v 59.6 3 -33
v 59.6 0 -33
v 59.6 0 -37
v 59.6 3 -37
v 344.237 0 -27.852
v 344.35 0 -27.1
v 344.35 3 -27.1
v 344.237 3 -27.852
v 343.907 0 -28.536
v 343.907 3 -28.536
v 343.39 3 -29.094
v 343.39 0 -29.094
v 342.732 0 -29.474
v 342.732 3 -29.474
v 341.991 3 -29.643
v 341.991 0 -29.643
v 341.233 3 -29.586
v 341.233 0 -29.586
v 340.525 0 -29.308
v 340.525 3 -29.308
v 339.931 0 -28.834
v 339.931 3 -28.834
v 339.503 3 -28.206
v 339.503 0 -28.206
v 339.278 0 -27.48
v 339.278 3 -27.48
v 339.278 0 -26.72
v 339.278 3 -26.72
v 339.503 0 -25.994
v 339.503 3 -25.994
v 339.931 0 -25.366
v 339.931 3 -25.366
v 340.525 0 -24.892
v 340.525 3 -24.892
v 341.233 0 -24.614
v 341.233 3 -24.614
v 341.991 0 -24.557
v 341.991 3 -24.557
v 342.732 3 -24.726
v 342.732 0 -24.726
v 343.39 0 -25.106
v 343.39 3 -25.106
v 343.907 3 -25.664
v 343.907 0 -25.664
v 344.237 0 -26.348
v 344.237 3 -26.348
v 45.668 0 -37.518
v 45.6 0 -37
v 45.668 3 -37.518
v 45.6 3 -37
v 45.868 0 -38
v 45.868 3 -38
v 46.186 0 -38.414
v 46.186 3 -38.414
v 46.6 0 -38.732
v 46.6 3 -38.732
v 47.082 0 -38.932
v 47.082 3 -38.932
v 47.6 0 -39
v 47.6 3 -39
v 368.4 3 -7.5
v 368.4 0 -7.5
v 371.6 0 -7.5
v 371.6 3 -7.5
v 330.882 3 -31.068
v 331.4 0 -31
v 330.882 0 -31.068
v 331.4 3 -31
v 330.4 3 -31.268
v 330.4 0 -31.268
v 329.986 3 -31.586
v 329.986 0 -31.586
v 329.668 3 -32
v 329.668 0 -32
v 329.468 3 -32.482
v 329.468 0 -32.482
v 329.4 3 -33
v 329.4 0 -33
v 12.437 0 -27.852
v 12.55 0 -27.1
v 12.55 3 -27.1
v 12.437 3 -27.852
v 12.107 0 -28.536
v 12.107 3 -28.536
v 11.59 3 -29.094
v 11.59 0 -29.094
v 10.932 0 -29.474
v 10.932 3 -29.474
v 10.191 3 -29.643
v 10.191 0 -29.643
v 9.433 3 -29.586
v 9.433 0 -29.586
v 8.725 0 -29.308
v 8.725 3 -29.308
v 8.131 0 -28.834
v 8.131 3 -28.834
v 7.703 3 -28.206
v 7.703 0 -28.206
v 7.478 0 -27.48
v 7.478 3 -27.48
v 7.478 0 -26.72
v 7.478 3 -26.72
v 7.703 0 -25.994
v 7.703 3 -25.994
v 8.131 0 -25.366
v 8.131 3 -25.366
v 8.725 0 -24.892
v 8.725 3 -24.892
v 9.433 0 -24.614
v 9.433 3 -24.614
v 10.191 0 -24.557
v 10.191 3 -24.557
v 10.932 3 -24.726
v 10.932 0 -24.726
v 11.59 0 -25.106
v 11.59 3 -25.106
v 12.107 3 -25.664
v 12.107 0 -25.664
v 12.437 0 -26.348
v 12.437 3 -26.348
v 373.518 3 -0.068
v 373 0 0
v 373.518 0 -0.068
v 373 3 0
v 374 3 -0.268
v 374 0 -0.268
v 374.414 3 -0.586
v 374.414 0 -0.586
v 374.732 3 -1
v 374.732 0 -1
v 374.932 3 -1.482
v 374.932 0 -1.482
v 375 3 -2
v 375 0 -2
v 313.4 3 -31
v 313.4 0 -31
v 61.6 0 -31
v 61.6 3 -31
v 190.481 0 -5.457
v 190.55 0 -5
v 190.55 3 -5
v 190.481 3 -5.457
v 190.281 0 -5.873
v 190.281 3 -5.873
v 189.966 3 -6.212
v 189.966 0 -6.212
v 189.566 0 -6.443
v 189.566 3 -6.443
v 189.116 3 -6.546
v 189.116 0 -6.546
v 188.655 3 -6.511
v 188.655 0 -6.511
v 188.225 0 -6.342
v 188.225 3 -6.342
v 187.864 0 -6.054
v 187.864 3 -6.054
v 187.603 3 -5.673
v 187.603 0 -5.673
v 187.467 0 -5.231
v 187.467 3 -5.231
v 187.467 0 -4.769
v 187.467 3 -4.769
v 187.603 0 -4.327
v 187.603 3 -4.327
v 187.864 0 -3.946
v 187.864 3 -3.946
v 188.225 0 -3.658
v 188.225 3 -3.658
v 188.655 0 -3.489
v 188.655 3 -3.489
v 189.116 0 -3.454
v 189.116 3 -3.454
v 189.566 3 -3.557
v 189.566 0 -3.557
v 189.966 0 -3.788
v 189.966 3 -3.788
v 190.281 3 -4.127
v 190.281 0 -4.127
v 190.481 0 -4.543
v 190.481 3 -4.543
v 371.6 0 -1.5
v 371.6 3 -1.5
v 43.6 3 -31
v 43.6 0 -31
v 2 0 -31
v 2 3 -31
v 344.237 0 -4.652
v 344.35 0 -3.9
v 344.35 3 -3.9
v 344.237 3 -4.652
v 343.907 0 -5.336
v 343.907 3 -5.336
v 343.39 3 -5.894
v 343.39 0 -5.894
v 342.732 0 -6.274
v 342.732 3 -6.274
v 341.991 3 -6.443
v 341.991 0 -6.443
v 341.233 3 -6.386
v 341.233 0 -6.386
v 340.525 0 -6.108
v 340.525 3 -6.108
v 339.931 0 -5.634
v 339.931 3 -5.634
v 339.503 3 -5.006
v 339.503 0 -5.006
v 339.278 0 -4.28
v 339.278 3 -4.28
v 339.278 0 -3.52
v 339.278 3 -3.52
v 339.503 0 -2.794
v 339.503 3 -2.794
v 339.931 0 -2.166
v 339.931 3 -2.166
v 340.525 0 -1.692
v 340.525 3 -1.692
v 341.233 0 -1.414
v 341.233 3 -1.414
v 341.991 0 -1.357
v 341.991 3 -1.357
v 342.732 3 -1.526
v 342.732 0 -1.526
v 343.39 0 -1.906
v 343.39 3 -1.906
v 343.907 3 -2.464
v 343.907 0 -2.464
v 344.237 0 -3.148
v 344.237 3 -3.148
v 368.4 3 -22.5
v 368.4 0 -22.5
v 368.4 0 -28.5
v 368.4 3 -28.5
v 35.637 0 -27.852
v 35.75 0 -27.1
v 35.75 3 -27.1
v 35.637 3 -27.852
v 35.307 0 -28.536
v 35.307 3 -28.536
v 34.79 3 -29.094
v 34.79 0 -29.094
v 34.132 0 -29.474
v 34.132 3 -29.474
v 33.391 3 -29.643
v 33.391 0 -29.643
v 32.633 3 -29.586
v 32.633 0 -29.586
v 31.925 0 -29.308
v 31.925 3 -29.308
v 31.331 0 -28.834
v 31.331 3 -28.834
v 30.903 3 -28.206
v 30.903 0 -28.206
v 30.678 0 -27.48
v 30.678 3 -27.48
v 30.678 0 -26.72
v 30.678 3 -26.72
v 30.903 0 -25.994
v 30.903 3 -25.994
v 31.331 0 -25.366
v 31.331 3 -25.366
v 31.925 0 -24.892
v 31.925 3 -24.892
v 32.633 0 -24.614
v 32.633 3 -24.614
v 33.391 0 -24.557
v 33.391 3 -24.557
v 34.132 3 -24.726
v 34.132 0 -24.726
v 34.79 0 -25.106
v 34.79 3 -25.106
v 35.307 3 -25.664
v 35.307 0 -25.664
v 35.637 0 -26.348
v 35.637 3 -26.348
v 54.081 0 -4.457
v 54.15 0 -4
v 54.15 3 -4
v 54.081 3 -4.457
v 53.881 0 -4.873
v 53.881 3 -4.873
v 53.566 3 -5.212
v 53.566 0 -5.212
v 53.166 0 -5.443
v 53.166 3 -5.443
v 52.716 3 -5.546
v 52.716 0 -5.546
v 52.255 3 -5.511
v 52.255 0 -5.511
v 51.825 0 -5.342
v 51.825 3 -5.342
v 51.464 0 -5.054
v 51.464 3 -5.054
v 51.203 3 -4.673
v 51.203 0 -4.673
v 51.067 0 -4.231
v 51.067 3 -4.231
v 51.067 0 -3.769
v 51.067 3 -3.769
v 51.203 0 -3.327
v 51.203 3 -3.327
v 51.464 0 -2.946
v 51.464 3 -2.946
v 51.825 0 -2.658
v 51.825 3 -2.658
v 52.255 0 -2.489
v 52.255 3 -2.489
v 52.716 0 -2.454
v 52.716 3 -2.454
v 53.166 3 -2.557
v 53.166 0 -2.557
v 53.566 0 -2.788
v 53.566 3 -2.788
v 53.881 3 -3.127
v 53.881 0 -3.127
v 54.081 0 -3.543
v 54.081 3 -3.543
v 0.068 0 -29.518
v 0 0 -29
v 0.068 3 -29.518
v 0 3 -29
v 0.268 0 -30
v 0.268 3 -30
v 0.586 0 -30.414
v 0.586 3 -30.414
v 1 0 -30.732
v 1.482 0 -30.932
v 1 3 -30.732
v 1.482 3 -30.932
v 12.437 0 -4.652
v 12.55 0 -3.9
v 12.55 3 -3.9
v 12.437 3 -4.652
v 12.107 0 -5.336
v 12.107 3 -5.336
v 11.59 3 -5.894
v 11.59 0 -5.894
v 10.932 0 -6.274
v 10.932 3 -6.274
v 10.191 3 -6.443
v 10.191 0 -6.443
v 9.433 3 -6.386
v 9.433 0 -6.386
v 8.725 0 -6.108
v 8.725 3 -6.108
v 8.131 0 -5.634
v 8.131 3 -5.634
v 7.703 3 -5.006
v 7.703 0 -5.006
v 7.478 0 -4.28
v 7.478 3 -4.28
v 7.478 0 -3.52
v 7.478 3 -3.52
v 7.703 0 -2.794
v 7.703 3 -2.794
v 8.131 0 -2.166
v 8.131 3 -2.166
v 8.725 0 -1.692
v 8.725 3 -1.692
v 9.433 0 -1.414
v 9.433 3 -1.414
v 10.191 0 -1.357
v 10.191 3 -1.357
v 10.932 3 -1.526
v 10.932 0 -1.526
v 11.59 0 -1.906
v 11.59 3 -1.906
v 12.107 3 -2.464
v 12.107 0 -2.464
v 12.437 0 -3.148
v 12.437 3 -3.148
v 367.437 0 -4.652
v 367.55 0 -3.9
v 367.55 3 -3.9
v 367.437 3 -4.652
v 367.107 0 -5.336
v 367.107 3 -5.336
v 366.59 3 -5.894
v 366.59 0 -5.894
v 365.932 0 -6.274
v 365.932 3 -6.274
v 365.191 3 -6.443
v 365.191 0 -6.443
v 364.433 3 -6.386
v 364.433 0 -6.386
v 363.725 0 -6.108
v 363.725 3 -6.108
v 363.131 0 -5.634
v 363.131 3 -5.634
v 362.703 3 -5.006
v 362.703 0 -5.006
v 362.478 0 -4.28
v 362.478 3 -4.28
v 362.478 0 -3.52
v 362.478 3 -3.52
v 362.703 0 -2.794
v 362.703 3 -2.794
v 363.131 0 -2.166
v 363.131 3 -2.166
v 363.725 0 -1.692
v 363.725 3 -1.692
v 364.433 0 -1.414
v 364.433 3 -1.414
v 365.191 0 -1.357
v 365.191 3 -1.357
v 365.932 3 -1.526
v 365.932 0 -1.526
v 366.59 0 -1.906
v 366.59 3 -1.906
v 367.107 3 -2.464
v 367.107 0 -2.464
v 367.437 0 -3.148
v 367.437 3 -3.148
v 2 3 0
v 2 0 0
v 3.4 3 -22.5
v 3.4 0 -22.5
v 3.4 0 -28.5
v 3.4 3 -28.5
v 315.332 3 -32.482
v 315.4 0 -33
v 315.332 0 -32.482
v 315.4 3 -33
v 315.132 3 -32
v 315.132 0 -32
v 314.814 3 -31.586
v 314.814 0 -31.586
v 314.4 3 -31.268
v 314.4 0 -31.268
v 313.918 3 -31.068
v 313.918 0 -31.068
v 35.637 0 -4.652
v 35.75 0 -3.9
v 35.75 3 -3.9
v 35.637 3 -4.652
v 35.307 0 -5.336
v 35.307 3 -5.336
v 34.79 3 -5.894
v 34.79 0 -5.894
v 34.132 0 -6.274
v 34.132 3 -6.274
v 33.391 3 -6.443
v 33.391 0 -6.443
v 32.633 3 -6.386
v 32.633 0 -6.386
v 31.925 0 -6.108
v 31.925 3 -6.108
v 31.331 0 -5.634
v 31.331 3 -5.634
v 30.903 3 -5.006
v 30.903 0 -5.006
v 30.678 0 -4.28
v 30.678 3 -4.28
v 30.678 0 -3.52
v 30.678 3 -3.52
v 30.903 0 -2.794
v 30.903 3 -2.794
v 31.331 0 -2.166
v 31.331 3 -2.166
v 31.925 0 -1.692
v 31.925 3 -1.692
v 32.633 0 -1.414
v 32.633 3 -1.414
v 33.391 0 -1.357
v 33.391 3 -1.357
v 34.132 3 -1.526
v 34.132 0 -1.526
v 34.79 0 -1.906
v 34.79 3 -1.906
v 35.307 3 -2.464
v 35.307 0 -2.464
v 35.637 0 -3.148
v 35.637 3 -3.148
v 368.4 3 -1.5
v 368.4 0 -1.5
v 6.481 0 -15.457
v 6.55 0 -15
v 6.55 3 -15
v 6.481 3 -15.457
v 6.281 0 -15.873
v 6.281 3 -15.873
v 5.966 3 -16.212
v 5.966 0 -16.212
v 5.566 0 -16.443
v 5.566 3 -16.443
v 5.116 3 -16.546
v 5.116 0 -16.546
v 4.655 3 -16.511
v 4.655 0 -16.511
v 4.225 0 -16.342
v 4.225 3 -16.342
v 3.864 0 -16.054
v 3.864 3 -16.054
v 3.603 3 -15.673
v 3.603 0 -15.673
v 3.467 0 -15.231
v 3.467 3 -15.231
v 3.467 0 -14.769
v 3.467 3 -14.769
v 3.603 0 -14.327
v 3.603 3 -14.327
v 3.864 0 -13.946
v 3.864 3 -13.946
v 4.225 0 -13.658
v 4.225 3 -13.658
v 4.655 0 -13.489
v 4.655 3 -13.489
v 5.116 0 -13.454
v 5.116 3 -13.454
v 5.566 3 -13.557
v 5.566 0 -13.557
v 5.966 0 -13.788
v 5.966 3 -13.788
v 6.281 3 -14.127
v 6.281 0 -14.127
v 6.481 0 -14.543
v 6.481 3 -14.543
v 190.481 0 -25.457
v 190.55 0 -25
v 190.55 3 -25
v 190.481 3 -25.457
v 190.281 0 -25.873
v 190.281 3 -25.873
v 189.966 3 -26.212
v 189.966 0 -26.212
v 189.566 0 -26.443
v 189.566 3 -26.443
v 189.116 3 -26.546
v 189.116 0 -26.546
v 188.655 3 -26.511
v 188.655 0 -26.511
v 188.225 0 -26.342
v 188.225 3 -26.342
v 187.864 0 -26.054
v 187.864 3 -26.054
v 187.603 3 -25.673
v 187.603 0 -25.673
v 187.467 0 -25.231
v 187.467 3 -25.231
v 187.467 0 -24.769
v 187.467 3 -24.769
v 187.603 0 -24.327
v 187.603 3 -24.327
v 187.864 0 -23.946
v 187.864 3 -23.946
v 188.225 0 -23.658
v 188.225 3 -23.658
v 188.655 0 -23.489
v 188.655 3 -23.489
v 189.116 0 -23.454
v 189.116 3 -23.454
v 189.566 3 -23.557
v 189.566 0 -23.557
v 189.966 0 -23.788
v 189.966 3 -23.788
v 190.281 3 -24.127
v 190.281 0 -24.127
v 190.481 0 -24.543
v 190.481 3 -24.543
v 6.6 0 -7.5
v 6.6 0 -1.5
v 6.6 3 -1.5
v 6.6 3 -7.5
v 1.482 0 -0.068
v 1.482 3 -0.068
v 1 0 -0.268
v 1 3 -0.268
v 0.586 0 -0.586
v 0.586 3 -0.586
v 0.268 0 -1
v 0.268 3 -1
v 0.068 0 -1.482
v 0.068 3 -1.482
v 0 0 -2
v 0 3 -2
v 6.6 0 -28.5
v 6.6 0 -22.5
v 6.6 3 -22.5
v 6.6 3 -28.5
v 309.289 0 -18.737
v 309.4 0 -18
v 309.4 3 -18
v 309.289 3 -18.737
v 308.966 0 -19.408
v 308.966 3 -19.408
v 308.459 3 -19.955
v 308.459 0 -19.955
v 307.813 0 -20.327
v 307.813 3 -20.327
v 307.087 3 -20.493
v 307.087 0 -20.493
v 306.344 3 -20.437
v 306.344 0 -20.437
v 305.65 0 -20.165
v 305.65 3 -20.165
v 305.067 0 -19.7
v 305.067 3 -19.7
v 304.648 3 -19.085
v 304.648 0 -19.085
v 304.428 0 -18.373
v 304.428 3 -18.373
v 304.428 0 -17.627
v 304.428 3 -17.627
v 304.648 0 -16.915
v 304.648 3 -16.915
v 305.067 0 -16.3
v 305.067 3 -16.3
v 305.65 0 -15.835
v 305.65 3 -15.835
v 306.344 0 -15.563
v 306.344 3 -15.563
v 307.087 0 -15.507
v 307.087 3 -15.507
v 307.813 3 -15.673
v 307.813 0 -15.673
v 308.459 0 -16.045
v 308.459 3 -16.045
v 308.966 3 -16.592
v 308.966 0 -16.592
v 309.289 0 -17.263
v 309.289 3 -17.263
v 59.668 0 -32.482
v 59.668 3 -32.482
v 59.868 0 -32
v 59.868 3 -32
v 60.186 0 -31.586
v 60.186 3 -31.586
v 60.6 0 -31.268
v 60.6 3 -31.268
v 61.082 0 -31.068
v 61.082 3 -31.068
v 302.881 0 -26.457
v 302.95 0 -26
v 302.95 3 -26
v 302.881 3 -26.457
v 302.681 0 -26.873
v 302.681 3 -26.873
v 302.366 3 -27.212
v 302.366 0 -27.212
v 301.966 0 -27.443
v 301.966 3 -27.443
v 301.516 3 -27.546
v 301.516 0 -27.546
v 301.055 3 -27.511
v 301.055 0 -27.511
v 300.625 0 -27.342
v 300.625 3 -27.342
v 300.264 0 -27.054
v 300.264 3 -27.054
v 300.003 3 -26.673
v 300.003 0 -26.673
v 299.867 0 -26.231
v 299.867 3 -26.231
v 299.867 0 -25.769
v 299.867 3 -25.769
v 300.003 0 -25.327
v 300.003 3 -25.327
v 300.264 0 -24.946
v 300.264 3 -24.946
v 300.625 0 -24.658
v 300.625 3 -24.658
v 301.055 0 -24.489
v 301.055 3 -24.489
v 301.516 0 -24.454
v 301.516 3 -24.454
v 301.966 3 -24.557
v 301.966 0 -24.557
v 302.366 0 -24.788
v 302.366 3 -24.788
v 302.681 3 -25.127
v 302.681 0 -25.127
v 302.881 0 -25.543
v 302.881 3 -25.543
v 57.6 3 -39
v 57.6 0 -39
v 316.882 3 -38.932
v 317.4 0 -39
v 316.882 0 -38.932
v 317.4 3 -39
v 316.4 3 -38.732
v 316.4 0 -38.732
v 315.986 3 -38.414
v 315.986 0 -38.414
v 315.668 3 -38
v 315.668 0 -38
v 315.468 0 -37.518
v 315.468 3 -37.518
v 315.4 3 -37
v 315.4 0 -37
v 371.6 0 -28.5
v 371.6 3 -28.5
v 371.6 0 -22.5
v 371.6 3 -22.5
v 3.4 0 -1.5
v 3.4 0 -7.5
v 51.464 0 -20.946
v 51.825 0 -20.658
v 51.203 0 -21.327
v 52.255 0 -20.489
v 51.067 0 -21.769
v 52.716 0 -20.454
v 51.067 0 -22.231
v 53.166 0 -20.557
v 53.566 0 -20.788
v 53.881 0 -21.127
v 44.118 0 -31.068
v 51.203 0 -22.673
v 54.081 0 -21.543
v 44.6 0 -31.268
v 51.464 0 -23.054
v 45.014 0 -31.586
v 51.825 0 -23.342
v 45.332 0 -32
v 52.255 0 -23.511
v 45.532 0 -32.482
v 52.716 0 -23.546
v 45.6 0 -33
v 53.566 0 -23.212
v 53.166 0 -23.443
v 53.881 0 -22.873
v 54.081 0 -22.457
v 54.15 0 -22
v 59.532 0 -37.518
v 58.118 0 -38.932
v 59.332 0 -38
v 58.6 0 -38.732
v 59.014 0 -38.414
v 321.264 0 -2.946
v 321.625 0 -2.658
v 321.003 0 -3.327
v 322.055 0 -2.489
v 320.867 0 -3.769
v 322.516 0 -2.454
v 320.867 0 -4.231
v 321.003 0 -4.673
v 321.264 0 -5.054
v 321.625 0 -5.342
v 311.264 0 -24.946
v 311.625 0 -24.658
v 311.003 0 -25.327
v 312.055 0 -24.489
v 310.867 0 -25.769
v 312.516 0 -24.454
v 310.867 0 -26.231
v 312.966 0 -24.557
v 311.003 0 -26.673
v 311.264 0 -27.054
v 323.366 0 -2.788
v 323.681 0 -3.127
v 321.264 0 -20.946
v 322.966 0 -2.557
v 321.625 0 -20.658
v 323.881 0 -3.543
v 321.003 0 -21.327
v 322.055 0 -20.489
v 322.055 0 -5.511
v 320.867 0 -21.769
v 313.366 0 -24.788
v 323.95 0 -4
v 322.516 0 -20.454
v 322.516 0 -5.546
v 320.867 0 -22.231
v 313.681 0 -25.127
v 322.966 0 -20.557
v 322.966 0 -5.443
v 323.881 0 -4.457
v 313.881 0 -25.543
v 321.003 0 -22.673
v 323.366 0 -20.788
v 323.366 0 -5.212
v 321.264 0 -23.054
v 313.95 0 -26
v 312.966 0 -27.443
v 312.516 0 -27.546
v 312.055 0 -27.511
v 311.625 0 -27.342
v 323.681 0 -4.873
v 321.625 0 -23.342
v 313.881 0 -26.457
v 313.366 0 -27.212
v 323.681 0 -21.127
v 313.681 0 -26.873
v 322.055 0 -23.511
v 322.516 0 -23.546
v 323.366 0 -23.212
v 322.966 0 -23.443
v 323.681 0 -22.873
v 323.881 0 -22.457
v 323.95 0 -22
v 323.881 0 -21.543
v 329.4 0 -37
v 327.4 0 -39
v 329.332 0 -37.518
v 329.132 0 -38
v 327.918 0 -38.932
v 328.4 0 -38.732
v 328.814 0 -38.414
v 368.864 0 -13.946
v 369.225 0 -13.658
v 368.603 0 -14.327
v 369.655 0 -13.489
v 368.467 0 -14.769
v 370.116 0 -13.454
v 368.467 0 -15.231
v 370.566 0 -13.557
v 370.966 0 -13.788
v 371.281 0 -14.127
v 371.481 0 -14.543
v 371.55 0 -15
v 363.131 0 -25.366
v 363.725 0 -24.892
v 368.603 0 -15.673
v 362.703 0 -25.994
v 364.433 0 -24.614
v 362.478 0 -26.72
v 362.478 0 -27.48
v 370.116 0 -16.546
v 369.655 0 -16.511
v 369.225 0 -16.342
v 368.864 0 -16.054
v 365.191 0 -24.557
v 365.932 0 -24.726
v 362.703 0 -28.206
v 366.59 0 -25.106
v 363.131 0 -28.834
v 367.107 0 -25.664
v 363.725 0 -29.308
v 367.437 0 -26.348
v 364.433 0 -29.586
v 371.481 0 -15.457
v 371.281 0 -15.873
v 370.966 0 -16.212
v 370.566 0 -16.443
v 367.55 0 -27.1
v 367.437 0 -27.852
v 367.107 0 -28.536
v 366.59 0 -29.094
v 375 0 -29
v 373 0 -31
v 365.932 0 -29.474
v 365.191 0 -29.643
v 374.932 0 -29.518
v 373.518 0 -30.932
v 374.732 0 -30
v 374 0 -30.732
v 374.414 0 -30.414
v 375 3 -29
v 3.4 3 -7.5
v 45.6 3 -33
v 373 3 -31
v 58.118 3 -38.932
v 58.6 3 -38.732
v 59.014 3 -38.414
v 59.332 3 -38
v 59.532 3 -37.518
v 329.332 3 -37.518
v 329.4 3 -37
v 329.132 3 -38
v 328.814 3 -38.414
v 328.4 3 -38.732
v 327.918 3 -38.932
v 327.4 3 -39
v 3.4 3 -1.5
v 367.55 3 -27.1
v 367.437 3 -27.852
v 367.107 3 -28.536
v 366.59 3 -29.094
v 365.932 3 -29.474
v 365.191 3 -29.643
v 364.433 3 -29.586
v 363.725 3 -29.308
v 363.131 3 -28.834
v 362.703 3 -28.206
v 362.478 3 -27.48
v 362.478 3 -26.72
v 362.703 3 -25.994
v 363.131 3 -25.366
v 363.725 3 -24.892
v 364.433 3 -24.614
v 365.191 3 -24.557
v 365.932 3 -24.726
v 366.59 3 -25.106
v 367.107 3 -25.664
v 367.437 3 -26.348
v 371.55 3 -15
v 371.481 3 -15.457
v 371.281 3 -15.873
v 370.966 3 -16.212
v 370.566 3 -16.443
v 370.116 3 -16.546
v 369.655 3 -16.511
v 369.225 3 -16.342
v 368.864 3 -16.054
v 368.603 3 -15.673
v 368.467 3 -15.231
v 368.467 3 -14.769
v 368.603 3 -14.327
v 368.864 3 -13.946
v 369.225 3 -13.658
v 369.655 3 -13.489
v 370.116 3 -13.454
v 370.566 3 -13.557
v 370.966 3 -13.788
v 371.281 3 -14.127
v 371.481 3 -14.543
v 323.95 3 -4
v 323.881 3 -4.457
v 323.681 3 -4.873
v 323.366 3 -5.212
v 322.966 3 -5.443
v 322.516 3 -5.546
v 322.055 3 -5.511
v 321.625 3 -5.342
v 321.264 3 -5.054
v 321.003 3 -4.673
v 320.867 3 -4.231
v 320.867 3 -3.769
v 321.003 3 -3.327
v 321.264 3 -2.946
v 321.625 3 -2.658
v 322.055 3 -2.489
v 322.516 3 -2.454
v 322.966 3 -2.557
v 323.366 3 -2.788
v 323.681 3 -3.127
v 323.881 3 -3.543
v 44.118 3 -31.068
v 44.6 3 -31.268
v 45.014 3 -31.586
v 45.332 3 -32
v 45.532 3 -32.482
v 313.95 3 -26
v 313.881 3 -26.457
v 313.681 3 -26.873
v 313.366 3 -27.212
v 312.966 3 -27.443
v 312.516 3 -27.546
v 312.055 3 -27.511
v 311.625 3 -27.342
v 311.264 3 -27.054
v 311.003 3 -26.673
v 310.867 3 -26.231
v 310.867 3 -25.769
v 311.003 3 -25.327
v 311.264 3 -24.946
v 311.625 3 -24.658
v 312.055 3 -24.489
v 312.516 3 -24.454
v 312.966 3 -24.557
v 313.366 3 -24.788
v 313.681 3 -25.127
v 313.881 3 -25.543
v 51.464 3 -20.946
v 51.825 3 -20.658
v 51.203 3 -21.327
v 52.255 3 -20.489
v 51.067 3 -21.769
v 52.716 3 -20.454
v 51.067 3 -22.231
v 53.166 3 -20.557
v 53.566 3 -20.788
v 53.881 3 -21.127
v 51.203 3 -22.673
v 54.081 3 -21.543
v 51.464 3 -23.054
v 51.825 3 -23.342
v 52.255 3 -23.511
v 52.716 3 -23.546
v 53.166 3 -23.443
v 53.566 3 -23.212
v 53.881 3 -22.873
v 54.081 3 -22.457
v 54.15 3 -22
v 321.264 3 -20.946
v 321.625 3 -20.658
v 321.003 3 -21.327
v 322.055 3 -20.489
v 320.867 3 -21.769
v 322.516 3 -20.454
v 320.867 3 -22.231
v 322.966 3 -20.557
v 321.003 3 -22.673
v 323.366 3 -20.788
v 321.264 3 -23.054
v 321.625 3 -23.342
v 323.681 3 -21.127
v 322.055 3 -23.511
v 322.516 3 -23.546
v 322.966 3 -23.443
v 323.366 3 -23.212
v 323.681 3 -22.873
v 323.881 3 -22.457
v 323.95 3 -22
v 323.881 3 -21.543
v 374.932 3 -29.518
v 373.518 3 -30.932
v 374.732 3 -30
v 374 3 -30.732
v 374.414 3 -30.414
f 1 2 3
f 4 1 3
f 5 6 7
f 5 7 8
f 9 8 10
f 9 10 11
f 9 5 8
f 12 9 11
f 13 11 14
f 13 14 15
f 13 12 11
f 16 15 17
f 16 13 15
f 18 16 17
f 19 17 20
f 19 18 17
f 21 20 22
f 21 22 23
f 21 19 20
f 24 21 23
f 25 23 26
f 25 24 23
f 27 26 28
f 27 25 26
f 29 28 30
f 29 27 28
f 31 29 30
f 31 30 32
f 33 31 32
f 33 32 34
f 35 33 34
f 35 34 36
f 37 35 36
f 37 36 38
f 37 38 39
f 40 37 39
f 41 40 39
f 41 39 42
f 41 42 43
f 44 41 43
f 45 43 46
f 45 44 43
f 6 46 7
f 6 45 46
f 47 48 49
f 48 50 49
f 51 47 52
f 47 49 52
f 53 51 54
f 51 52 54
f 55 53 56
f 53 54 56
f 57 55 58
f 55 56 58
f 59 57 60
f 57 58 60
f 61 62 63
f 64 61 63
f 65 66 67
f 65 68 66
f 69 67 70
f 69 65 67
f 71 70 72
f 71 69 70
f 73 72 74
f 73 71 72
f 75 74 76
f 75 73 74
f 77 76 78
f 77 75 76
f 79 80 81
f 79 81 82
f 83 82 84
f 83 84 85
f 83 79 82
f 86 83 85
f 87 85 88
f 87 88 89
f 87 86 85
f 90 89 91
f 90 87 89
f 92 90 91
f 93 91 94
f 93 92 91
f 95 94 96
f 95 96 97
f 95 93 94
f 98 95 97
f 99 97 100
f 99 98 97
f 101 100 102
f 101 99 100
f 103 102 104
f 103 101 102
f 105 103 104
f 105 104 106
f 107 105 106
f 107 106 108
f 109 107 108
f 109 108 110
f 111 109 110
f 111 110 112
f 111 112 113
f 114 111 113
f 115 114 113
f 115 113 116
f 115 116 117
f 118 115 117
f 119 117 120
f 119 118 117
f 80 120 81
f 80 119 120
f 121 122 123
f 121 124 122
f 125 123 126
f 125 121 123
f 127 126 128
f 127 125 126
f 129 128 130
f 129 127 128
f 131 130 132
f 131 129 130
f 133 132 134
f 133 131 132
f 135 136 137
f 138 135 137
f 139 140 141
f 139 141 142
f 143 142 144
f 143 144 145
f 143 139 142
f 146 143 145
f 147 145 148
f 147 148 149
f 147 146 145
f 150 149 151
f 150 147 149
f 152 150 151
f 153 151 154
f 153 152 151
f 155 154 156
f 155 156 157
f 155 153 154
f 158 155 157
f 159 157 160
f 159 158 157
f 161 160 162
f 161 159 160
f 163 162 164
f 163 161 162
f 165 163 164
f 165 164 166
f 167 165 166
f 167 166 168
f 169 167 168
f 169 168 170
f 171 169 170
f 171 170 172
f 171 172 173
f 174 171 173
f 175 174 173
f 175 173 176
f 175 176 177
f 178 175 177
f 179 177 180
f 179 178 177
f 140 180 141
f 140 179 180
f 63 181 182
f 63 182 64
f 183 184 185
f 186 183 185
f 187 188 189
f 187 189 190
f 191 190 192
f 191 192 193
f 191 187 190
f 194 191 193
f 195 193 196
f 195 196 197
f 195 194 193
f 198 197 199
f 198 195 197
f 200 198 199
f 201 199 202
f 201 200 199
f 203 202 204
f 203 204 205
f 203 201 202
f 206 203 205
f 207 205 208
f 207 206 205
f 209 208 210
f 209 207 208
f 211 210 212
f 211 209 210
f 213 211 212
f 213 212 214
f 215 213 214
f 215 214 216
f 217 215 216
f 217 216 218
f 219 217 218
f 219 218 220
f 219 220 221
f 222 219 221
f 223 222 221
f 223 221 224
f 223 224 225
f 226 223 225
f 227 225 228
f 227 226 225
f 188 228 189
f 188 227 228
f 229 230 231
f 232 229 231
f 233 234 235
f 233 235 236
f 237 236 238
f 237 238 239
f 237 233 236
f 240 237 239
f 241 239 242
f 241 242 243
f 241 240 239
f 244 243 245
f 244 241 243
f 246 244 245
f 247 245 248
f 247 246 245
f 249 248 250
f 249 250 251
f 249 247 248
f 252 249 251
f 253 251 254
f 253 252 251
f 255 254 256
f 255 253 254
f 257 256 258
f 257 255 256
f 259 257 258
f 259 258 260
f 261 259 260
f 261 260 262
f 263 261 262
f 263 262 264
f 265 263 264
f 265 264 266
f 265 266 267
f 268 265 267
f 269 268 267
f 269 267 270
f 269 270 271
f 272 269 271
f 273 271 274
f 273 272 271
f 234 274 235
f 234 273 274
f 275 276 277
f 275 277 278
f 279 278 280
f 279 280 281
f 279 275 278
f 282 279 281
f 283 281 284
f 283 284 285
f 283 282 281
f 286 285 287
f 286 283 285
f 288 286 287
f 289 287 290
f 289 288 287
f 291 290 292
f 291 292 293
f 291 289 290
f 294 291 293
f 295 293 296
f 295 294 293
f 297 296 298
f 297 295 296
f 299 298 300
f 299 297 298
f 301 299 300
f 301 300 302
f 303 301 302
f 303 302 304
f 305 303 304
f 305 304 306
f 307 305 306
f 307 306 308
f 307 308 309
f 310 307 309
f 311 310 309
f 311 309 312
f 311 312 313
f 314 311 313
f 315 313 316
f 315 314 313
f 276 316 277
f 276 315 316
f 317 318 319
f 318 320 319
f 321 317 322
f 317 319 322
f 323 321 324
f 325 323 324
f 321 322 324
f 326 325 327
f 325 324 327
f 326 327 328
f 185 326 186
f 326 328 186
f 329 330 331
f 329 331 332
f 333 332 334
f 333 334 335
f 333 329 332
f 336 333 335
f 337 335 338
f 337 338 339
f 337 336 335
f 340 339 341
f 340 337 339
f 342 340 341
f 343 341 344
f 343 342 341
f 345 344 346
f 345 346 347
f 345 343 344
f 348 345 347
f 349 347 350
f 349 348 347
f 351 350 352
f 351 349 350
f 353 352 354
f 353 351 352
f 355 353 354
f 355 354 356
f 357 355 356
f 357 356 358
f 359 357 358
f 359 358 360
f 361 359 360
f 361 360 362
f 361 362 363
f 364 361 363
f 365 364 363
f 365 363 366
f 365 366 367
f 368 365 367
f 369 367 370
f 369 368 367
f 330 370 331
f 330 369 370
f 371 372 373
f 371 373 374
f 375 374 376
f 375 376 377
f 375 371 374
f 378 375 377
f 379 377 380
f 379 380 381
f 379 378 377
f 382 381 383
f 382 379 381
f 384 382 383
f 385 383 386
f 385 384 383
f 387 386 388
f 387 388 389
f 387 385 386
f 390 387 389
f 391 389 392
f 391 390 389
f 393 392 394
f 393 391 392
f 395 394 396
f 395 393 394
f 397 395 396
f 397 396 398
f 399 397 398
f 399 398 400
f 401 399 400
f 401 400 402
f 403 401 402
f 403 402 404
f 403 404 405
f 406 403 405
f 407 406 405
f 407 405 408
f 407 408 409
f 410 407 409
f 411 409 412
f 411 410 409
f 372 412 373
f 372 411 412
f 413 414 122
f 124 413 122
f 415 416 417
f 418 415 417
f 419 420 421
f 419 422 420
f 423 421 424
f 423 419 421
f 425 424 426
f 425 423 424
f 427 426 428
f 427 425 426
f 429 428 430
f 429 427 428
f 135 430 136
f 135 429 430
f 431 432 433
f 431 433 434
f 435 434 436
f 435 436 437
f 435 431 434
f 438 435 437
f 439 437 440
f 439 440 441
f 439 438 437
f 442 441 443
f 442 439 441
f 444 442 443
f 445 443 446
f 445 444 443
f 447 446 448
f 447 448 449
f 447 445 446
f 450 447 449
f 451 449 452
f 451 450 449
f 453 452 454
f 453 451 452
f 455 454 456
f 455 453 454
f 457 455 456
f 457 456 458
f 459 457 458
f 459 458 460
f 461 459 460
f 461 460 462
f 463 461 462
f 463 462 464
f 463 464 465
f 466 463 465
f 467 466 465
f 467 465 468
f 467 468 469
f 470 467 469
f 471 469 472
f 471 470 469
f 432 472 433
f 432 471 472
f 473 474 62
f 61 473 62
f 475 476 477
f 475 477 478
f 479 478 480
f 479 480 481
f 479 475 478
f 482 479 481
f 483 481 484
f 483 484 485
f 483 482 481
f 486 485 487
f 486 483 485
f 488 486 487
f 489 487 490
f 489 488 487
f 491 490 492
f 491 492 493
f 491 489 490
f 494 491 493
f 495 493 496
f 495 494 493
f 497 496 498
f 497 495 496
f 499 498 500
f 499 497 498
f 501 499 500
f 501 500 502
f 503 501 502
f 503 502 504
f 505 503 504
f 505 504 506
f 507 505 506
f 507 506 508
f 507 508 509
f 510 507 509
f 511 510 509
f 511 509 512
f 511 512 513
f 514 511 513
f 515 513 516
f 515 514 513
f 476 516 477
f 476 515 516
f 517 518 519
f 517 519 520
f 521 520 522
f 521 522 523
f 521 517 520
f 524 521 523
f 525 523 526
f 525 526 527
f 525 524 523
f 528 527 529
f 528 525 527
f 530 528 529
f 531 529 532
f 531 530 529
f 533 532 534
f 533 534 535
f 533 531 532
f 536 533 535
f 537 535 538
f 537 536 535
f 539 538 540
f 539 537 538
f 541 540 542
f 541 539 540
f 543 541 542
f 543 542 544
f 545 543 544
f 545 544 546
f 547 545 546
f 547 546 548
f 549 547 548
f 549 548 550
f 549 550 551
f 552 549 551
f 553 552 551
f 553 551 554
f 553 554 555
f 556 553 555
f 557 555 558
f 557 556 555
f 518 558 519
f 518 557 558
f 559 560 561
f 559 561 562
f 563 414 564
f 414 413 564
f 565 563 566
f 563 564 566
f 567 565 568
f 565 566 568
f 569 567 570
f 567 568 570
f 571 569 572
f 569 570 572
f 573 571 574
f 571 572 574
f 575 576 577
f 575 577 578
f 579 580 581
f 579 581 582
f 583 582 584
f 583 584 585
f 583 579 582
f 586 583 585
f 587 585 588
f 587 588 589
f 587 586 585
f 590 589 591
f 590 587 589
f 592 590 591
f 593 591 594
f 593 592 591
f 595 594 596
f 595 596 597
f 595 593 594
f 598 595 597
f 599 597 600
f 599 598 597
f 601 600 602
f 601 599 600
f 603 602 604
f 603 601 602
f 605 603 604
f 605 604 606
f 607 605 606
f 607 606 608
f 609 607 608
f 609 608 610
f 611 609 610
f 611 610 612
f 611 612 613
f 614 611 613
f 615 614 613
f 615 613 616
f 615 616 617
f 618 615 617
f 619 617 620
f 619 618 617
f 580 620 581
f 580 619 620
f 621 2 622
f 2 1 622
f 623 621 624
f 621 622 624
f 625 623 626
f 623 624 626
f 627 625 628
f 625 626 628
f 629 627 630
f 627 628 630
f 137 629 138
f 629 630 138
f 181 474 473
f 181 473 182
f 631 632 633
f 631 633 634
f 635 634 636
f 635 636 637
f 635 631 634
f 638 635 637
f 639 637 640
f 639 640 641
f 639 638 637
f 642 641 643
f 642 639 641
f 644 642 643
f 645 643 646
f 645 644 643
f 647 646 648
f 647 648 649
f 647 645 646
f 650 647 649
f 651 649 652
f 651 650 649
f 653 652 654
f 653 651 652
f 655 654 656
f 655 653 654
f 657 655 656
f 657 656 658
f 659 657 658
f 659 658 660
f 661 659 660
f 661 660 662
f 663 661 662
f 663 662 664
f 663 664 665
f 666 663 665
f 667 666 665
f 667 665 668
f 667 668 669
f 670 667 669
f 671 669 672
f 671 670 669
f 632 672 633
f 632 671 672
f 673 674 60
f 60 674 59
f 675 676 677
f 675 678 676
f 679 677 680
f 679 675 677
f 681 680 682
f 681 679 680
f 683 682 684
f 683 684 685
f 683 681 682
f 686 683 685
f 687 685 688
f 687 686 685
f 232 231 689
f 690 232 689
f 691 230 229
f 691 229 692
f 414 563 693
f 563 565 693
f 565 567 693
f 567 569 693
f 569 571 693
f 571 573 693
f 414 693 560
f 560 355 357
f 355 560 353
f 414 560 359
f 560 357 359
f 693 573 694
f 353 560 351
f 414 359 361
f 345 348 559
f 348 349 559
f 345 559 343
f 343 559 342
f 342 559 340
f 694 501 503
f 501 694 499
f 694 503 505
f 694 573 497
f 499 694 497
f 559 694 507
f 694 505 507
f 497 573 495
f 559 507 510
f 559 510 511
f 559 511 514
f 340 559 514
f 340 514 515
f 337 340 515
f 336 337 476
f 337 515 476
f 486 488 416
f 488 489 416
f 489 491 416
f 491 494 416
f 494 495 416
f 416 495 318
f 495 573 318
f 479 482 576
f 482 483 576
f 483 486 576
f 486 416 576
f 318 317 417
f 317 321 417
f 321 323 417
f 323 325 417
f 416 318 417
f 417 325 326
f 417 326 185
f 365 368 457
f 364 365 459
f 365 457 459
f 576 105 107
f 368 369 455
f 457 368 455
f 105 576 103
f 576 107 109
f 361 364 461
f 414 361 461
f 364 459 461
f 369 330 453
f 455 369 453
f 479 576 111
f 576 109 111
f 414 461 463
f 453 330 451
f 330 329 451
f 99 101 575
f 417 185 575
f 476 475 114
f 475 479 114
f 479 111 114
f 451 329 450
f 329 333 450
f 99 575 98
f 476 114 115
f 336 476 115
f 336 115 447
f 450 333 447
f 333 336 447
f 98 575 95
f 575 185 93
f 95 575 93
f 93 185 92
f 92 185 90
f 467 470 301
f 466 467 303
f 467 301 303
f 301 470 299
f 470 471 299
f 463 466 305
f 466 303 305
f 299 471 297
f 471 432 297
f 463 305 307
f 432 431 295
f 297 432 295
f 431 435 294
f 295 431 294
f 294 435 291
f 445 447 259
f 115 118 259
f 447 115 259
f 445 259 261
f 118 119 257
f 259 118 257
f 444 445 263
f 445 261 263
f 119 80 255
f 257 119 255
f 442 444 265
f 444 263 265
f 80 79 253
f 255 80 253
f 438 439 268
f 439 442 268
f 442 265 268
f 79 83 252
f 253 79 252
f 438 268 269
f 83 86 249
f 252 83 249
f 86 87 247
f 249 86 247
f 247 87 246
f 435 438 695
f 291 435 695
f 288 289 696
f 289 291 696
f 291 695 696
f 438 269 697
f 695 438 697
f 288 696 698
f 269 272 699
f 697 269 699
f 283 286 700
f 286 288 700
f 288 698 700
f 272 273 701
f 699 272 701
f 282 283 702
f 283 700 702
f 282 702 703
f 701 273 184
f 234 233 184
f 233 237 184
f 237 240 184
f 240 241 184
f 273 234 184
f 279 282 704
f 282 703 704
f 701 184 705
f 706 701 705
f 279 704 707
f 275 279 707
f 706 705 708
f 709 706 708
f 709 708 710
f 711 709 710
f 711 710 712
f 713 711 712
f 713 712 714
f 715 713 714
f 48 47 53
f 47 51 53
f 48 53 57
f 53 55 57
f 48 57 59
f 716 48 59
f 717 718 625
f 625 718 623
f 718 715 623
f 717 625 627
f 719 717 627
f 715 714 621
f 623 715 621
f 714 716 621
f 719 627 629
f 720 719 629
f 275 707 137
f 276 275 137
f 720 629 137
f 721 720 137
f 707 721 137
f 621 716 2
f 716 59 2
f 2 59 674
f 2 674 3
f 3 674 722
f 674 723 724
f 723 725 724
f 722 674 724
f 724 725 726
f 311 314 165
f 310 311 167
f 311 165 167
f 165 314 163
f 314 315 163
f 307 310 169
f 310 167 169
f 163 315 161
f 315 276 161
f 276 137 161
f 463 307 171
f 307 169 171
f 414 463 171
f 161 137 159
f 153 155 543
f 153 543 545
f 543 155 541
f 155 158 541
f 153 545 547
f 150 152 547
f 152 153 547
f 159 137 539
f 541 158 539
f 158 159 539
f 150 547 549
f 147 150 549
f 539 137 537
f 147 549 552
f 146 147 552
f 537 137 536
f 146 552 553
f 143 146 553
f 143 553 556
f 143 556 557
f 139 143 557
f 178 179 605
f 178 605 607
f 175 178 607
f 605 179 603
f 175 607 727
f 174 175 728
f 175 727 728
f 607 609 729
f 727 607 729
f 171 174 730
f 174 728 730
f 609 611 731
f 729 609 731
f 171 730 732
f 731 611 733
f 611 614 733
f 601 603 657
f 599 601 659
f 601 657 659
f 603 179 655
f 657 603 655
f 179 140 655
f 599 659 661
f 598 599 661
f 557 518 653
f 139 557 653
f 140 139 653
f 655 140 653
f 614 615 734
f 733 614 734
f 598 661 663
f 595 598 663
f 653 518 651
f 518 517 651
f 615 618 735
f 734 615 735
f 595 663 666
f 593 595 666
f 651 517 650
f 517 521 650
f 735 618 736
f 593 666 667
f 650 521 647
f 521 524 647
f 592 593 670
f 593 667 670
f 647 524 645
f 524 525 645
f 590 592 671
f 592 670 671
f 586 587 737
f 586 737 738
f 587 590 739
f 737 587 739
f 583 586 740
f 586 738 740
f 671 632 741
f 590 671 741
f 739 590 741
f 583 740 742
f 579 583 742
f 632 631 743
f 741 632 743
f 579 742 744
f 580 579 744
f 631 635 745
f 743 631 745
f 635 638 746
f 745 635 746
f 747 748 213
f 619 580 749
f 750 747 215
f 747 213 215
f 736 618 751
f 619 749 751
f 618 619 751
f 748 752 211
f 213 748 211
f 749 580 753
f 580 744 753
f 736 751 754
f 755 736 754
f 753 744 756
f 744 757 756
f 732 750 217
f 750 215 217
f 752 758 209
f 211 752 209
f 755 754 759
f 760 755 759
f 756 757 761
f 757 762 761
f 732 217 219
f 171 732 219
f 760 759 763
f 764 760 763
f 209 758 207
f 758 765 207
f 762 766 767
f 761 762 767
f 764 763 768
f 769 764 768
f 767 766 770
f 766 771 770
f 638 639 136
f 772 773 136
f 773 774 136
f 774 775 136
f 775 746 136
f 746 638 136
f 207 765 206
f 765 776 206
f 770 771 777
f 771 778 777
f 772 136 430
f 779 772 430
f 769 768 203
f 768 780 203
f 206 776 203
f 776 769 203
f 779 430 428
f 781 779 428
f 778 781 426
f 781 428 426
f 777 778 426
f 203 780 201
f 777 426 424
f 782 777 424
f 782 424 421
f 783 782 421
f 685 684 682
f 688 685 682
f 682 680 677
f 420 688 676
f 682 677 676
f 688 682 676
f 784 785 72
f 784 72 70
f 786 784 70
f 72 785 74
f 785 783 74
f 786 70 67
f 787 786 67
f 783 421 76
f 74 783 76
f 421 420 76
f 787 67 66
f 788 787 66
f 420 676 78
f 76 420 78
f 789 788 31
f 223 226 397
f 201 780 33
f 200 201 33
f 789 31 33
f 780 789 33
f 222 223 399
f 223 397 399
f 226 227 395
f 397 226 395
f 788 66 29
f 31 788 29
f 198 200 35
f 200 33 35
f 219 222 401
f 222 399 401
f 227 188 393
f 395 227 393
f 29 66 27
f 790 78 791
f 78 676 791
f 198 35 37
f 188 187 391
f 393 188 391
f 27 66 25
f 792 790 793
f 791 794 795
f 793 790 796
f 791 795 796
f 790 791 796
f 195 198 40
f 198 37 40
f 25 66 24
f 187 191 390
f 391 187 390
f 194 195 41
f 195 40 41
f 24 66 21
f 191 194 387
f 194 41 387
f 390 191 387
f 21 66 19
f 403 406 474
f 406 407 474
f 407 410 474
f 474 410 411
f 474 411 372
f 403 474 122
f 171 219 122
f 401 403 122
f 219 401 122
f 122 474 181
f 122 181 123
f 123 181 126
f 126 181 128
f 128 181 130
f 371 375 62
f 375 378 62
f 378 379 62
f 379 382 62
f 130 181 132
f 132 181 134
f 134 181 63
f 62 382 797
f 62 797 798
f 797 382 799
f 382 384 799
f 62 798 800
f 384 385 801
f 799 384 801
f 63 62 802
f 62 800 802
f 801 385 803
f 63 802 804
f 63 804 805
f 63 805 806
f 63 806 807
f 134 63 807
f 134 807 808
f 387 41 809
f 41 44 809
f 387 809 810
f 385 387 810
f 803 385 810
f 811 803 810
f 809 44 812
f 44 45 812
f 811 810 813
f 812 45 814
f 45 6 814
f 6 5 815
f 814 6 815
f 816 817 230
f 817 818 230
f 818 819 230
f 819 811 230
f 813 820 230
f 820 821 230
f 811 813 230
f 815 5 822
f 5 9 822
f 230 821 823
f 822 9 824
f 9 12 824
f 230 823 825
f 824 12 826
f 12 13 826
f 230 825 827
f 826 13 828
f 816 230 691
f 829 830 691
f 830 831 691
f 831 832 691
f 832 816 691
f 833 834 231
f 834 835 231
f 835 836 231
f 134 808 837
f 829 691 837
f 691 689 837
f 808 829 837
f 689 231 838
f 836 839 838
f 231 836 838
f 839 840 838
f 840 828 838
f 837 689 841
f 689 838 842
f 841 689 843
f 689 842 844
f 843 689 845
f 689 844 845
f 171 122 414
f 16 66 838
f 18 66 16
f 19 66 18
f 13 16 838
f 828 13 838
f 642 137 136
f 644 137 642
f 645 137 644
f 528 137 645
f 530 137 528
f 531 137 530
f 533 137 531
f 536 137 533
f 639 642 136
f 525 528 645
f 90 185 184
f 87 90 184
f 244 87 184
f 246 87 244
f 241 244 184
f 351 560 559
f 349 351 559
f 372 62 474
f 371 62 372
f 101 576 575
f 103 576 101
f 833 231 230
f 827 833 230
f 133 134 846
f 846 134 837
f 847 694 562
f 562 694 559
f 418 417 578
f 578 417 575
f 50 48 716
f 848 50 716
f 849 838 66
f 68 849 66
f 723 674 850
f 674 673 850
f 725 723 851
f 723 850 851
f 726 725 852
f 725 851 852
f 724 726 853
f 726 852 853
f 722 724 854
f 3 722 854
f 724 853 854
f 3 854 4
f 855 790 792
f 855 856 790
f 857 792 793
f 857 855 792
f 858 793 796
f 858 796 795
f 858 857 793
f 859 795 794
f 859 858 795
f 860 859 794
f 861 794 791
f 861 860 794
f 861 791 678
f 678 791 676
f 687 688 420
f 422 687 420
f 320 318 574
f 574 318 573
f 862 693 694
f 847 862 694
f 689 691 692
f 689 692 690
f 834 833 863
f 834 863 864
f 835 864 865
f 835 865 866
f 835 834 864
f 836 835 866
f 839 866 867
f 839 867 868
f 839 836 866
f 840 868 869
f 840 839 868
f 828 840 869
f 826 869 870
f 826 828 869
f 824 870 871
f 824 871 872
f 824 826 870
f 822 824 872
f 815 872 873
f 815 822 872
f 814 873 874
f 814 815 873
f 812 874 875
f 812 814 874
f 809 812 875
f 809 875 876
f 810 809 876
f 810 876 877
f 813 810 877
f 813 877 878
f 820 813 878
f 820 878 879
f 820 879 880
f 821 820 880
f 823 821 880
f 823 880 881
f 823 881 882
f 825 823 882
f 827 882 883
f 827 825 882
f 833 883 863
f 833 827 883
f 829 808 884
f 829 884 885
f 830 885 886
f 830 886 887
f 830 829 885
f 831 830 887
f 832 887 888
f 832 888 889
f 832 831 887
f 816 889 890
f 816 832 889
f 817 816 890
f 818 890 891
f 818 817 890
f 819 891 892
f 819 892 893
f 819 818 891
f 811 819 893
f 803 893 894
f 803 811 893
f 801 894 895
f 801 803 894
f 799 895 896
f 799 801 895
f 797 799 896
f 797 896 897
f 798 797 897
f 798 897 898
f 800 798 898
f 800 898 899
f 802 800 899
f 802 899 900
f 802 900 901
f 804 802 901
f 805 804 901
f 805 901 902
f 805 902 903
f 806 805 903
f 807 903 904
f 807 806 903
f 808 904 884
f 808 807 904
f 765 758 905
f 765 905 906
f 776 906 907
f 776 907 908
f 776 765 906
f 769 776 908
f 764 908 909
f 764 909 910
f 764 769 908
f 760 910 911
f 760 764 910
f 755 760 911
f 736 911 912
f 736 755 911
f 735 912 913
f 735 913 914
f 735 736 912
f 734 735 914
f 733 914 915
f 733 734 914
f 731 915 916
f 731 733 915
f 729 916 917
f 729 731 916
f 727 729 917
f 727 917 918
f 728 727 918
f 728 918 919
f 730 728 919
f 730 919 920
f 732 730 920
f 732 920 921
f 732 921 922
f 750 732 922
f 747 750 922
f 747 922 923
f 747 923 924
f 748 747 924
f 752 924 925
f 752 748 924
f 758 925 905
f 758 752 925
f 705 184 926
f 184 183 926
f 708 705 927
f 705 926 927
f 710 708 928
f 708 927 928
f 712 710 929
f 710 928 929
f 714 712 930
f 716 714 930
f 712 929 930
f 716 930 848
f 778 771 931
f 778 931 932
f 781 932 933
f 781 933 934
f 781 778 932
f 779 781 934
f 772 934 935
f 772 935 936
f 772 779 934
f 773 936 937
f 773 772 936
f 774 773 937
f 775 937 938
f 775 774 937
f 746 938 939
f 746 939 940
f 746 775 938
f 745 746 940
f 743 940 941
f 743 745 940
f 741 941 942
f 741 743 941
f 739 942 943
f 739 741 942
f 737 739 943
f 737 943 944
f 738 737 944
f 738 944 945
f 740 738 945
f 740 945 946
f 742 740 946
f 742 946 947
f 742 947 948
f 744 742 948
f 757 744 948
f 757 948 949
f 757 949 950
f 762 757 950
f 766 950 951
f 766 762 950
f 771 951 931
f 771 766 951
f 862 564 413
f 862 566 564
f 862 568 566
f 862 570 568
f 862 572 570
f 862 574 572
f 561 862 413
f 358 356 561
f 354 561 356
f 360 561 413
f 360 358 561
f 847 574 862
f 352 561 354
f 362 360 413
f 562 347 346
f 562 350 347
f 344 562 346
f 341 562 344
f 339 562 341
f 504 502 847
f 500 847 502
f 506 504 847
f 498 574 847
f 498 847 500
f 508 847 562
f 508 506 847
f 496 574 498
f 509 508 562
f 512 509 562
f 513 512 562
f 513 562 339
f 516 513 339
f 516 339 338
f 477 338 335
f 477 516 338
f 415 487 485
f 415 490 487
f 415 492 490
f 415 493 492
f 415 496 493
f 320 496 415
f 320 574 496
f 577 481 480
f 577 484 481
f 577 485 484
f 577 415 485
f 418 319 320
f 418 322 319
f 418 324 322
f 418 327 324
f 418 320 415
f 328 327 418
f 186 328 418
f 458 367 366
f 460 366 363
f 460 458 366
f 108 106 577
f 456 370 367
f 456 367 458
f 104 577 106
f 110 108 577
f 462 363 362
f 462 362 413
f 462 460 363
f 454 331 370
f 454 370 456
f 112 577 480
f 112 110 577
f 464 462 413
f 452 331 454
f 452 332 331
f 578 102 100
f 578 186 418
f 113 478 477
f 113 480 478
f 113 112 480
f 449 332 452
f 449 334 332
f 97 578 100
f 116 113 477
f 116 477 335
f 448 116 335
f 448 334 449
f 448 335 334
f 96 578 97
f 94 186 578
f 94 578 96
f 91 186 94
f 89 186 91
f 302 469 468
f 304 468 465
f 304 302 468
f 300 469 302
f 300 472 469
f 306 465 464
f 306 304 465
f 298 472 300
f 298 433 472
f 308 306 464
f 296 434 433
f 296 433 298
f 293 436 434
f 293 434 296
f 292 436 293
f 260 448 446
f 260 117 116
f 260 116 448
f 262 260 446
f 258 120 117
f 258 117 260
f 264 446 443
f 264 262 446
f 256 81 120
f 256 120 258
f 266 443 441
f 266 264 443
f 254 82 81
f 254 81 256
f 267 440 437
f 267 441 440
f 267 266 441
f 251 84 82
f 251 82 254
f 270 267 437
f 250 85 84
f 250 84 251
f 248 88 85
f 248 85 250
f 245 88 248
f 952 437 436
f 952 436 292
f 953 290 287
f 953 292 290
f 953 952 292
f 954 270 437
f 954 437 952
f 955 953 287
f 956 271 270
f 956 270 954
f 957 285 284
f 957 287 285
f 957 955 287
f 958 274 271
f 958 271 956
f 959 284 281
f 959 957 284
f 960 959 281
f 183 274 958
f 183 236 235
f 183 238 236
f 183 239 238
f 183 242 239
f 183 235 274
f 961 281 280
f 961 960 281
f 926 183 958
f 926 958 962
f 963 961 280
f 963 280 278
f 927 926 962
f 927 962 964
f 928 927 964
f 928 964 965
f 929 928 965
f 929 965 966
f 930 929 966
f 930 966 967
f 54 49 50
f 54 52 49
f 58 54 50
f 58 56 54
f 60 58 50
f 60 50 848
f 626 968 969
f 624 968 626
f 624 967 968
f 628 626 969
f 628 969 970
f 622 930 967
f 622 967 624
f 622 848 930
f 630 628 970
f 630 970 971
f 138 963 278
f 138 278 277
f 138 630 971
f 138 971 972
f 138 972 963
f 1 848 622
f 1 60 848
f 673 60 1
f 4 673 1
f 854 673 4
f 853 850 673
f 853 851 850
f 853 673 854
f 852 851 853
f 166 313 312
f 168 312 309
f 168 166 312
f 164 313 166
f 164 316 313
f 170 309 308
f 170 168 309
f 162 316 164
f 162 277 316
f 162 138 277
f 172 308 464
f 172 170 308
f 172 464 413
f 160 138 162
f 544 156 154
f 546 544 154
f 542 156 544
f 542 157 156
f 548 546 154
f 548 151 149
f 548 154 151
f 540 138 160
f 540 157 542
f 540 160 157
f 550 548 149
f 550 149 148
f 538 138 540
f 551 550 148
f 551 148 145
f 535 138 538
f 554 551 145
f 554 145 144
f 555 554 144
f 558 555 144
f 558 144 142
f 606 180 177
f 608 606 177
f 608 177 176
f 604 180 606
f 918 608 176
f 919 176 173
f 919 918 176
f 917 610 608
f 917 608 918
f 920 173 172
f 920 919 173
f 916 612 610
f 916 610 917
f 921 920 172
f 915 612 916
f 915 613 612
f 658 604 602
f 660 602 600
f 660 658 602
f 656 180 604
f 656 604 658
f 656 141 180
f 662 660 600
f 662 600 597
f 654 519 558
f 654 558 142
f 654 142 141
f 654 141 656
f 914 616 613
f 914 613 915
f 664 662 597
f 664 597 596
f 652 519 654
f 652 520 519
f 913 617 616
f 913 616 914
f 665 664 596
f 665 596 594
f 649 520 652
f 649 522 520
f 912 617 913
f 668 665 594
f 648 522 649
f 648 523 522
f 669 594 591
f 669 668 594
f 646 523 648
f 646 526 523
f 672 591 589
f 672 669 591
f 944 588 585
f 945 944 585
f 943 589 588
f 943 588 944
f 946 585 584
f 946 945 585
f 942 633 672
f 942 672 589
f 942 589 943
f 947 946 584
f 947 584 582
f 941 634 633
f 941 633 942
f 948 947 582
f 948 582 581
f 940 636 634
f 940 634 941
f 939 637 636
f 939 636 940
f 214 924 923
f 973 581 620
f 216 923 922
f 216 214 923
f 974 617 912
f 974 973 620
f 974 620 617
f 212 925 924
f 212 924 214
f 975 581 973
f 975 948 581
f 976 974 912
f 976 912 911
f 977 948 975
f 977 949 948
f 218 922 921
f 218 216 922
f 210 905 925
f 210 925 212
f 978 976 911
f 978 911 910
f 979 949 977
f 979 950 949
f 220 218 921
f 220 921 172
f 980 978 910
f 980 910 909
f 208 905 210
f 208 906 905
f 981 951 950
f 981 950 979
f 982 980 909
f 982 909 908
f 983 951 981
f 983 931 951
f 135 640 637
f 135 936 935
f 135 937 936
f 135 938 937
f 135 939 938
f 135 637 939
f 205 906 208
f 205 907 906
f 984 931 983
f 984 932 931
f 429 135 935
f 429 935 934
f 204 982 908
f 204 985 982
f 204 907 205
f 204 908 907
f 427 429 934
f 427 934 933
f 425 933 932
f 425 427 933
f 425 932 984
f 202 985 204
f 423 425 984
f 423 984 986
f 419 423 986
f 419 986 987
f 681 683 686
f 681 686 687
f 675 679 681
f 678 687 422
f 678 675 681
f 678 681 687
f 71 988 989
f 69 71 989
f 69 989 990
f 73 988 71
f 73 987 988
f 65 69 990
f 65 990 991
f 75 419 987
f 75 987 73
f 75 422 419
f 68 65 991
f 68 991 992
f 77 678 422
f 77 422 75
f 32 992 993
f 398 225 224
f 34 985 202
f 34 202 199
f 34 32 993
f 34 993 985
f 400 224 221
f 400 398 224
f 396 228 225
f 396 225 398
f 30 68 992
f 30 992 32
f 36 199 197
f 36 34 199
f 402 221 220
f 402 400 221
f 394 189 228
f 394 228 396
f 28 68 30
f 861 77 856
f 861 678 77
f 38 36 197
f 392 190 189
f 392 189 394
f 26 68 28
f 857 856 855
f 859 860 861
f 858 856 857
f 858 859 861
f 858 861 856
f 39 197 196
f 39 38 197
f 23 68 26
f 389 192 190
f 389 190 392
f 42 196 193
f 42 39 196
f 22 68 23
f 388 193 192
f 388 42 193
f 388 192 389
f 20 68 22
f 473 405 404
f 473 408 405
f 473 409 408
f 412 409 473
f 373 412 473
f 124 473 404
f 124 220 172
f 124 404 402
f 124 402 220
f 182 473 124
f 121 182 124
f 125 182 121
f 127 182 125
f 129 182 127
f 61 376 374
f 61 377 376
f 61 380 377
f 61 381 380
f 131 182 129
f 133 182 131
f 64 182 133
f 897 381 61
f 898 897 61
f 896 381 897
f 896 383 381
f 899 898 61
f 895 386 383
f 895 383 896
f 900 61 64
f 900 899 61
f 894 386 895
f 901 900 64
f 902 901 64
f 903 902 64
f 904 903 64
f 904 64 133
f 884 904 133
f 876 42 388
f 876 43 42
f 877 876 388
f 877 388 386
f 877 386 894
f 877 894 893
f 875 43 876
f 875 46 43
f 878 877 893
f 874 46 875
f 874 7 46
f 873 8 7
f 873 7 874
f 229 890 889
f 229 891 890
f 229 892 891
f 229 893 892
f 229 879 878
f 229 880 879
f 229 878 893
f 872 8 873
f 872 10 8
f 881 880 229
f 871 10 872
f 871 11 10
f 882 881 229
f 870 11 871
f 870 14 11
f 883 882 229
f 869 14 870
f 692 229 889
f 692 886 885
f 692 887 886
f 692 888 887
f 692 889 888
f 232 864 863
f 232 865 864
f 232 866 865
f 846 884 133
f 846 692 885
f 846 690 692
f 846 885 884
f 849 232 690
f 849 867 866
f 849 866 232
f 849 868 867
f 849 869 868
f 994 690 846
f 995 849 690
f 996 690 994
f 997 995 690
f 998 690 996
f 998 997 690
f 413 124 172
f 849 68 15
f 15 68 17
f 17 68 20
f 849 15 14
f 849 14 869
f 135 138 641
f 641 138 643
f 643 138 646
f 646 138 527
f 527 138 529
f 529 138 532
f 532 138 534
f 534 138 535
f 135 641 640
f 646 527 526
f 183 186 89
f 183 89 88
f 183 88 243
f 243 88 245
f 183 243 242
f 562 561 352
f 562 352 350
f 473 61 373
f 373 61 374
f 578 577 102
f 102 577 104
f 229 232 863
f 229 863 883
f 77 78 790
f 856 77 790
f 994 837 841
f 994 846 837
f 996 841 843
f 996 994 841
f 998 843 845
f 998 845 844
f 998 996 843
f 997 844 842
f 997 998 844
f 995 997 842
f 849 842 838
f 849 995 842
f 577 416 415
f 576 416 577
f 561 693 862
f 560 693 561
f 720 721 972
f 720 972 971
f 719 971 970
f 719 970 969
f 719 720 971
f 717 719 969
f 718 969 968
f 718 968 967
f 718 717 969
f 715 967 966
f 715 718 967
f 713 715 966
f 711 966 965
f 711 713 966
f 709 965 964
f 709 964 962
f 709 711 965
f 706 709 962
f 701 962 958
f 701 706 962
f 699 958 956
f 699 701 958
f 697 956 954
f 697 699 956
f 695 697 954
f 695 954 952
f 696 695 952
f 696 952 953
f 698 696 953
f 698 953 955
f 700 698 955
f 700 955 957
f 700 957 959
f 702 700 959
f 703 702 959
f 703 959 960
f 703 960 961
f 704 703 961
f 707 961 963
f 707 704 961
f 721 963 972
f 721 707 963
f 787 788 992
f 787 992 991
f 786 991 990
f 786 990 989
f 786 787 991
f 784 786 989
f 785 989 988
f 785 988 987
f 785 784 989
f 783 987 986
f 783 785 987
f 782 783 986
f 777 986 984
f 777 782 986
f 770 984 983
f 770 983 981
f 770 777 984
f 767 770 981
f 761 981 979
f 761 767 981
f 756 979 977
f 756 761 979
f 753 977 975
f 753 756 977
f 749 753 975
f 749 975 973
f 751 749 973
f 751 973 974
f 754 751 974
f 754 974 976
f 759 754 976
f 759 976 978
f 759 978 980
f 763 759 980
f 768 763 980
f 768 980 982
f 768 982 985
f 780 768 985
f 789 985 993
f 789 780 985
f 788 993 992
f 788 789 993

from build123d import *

# Parameters (mm, degrees)
CROQUIS1_R              = 1.55
CROQUIS1_R_2            = 2.55
CROQUIS1_R_3            = 2.5
CROQUIS1_W              = 3.2
CROQUIS1_H              = 6
SALIENTE_EXTRUIR1_DEPTH = 3
REDONDEO2_R             = 2


with BuildPart() as part:
    # Croquis1 → Saliente-Extruir1 (new body)
    with BuildSketch(Plane(origin=(0, 0, 0), x_dir=(1, 0, 0), z_dir=(0, 1, 0))):
        Polygon((0, 0), (375, 0), (375, 31), (329.4, 31), (329.4, 39), (315.4, 39), (315.4, 31), (59.6, 31), (59.6, 39), (45.6, 39), (45.6, 31), (0, 31), align=None)
        with Locations((5, 15)):
            Circle(CROQUIS1_R, mode=Mode.SUBTRACT)
        with Locations((370, 15)):
            Circle(CROQUIS1_R, mode=Mode.SUBTRACT)
        with Locations((10, 27.1)):
            Circle(CROQUIS1_R_2, mode=Mode.SUBTRACT)
        with Locations((33.2, 27.1)):
            Circle(CROQUIS1_R_2, mode=Mode.SUBTRACT)
        with Locations((33.2, 3.9)):
            Circle(CROQUIS1_R_2, mode=Mode.SUBTRACT)
        with Locations((10, 3.9)):
            Circle(CROQUIS1_R_2, mode=Mode.SUBTRACT)
        with Locations((365, 3.9)):
            Circle(CROQUIS1_R_2, mode=Mode.SUBTRACT)
        with Locations((341.8, 3.9)):
            Circle(CROQUIS1_R_2, mode=Mode.SUBTRACT)
        with Locations((365, 27.1)):
            Circle(CROQUIS1_R_2, mode=Mode.SUBTRACT)
        with Locations((341.8, 27.1)):
            Circle(CROQUIS1_R_2, mode=Mode.SUBTRACT)
        with Locations((189, 25)):
            Circle(CROQUIS1_R, mode=Mode.SUBTRACT)
        with Locations((189, 5)):
            Circle(CROQUIS1_R, mode=Mode.SUBTRACT)
        with Locations((52.6, 22)):
            Circle(CROQUIS1_R, mode=Mode.SUBTRACT)
        with Locations((52.6, 4)):
            Circle(CROQUIS1_R, mode=Mode.SUBTRACT)
        with Locations((322.4, 22)):
            Circle(CROQUIS1_R, mode=Mode.SUBTRACT)
        with Locations((322.4, 4)):
            Circle(CROQUIS1_R, mode=Mode.SUBTRACT)
        with Locations((312.4, 26)):
            Circle(CROQUIS1_R, mode=Mode.SUBTRACT)
        with Locations((301.4, 26)):
            Circle(CROQUIS1_R, mode=Mode.SUBTRACT)
        with Locations((306.9, 18)):
            Circle(CROQUIS1_R_3, mode=Mode.SUBTRACT)
        with Locations((370, 4.5)):
            Rectangle(CROQUIS1_W, CROQUIS1_H, mode=Mode.SUBTRACT)
        with Locations((5, 25.5)):
            Rectangle(CROQUIS1_W, CROQUIS1_H, mode=Mode.SUBTRACT)
        with Locations((5, 4.5)):
            Rectangle(CROQUIS1_W, CROQUIS1_H, mode=Mode.SUBTRACT)
        with Locations((370, 25.5)):
            Rectangle(CROQUIS1_W, CROQUIS1_H, mode=Mode.SUBTRACT)
    extrude(amount=SALIENTE_EXTRUIR1_DEPTH)

    # Redondeo2
    redondeo2_edges = [part.edges().sort_by_distance(p)[0] for p in [
        (0, 1.5, -31),
        (45.6, 1.5, -31),
        (45.6, 1.5, -39),
        (59.6, 1.5, -39),
        (59.6, 1.5, -31),
        (315.4, 1.5, -31),
        (315.4, 1.5, -39),
        (329.4, 1.5, -39),
        (329.4, 1.5, -31),
        (375, 1.5, -31),
        (375, 1.5, 0),
        (0, 1.5, 0),
    ]]
    fillet(redondeo2_edges, radius=REDONDEO2_R)


solid = part.part
